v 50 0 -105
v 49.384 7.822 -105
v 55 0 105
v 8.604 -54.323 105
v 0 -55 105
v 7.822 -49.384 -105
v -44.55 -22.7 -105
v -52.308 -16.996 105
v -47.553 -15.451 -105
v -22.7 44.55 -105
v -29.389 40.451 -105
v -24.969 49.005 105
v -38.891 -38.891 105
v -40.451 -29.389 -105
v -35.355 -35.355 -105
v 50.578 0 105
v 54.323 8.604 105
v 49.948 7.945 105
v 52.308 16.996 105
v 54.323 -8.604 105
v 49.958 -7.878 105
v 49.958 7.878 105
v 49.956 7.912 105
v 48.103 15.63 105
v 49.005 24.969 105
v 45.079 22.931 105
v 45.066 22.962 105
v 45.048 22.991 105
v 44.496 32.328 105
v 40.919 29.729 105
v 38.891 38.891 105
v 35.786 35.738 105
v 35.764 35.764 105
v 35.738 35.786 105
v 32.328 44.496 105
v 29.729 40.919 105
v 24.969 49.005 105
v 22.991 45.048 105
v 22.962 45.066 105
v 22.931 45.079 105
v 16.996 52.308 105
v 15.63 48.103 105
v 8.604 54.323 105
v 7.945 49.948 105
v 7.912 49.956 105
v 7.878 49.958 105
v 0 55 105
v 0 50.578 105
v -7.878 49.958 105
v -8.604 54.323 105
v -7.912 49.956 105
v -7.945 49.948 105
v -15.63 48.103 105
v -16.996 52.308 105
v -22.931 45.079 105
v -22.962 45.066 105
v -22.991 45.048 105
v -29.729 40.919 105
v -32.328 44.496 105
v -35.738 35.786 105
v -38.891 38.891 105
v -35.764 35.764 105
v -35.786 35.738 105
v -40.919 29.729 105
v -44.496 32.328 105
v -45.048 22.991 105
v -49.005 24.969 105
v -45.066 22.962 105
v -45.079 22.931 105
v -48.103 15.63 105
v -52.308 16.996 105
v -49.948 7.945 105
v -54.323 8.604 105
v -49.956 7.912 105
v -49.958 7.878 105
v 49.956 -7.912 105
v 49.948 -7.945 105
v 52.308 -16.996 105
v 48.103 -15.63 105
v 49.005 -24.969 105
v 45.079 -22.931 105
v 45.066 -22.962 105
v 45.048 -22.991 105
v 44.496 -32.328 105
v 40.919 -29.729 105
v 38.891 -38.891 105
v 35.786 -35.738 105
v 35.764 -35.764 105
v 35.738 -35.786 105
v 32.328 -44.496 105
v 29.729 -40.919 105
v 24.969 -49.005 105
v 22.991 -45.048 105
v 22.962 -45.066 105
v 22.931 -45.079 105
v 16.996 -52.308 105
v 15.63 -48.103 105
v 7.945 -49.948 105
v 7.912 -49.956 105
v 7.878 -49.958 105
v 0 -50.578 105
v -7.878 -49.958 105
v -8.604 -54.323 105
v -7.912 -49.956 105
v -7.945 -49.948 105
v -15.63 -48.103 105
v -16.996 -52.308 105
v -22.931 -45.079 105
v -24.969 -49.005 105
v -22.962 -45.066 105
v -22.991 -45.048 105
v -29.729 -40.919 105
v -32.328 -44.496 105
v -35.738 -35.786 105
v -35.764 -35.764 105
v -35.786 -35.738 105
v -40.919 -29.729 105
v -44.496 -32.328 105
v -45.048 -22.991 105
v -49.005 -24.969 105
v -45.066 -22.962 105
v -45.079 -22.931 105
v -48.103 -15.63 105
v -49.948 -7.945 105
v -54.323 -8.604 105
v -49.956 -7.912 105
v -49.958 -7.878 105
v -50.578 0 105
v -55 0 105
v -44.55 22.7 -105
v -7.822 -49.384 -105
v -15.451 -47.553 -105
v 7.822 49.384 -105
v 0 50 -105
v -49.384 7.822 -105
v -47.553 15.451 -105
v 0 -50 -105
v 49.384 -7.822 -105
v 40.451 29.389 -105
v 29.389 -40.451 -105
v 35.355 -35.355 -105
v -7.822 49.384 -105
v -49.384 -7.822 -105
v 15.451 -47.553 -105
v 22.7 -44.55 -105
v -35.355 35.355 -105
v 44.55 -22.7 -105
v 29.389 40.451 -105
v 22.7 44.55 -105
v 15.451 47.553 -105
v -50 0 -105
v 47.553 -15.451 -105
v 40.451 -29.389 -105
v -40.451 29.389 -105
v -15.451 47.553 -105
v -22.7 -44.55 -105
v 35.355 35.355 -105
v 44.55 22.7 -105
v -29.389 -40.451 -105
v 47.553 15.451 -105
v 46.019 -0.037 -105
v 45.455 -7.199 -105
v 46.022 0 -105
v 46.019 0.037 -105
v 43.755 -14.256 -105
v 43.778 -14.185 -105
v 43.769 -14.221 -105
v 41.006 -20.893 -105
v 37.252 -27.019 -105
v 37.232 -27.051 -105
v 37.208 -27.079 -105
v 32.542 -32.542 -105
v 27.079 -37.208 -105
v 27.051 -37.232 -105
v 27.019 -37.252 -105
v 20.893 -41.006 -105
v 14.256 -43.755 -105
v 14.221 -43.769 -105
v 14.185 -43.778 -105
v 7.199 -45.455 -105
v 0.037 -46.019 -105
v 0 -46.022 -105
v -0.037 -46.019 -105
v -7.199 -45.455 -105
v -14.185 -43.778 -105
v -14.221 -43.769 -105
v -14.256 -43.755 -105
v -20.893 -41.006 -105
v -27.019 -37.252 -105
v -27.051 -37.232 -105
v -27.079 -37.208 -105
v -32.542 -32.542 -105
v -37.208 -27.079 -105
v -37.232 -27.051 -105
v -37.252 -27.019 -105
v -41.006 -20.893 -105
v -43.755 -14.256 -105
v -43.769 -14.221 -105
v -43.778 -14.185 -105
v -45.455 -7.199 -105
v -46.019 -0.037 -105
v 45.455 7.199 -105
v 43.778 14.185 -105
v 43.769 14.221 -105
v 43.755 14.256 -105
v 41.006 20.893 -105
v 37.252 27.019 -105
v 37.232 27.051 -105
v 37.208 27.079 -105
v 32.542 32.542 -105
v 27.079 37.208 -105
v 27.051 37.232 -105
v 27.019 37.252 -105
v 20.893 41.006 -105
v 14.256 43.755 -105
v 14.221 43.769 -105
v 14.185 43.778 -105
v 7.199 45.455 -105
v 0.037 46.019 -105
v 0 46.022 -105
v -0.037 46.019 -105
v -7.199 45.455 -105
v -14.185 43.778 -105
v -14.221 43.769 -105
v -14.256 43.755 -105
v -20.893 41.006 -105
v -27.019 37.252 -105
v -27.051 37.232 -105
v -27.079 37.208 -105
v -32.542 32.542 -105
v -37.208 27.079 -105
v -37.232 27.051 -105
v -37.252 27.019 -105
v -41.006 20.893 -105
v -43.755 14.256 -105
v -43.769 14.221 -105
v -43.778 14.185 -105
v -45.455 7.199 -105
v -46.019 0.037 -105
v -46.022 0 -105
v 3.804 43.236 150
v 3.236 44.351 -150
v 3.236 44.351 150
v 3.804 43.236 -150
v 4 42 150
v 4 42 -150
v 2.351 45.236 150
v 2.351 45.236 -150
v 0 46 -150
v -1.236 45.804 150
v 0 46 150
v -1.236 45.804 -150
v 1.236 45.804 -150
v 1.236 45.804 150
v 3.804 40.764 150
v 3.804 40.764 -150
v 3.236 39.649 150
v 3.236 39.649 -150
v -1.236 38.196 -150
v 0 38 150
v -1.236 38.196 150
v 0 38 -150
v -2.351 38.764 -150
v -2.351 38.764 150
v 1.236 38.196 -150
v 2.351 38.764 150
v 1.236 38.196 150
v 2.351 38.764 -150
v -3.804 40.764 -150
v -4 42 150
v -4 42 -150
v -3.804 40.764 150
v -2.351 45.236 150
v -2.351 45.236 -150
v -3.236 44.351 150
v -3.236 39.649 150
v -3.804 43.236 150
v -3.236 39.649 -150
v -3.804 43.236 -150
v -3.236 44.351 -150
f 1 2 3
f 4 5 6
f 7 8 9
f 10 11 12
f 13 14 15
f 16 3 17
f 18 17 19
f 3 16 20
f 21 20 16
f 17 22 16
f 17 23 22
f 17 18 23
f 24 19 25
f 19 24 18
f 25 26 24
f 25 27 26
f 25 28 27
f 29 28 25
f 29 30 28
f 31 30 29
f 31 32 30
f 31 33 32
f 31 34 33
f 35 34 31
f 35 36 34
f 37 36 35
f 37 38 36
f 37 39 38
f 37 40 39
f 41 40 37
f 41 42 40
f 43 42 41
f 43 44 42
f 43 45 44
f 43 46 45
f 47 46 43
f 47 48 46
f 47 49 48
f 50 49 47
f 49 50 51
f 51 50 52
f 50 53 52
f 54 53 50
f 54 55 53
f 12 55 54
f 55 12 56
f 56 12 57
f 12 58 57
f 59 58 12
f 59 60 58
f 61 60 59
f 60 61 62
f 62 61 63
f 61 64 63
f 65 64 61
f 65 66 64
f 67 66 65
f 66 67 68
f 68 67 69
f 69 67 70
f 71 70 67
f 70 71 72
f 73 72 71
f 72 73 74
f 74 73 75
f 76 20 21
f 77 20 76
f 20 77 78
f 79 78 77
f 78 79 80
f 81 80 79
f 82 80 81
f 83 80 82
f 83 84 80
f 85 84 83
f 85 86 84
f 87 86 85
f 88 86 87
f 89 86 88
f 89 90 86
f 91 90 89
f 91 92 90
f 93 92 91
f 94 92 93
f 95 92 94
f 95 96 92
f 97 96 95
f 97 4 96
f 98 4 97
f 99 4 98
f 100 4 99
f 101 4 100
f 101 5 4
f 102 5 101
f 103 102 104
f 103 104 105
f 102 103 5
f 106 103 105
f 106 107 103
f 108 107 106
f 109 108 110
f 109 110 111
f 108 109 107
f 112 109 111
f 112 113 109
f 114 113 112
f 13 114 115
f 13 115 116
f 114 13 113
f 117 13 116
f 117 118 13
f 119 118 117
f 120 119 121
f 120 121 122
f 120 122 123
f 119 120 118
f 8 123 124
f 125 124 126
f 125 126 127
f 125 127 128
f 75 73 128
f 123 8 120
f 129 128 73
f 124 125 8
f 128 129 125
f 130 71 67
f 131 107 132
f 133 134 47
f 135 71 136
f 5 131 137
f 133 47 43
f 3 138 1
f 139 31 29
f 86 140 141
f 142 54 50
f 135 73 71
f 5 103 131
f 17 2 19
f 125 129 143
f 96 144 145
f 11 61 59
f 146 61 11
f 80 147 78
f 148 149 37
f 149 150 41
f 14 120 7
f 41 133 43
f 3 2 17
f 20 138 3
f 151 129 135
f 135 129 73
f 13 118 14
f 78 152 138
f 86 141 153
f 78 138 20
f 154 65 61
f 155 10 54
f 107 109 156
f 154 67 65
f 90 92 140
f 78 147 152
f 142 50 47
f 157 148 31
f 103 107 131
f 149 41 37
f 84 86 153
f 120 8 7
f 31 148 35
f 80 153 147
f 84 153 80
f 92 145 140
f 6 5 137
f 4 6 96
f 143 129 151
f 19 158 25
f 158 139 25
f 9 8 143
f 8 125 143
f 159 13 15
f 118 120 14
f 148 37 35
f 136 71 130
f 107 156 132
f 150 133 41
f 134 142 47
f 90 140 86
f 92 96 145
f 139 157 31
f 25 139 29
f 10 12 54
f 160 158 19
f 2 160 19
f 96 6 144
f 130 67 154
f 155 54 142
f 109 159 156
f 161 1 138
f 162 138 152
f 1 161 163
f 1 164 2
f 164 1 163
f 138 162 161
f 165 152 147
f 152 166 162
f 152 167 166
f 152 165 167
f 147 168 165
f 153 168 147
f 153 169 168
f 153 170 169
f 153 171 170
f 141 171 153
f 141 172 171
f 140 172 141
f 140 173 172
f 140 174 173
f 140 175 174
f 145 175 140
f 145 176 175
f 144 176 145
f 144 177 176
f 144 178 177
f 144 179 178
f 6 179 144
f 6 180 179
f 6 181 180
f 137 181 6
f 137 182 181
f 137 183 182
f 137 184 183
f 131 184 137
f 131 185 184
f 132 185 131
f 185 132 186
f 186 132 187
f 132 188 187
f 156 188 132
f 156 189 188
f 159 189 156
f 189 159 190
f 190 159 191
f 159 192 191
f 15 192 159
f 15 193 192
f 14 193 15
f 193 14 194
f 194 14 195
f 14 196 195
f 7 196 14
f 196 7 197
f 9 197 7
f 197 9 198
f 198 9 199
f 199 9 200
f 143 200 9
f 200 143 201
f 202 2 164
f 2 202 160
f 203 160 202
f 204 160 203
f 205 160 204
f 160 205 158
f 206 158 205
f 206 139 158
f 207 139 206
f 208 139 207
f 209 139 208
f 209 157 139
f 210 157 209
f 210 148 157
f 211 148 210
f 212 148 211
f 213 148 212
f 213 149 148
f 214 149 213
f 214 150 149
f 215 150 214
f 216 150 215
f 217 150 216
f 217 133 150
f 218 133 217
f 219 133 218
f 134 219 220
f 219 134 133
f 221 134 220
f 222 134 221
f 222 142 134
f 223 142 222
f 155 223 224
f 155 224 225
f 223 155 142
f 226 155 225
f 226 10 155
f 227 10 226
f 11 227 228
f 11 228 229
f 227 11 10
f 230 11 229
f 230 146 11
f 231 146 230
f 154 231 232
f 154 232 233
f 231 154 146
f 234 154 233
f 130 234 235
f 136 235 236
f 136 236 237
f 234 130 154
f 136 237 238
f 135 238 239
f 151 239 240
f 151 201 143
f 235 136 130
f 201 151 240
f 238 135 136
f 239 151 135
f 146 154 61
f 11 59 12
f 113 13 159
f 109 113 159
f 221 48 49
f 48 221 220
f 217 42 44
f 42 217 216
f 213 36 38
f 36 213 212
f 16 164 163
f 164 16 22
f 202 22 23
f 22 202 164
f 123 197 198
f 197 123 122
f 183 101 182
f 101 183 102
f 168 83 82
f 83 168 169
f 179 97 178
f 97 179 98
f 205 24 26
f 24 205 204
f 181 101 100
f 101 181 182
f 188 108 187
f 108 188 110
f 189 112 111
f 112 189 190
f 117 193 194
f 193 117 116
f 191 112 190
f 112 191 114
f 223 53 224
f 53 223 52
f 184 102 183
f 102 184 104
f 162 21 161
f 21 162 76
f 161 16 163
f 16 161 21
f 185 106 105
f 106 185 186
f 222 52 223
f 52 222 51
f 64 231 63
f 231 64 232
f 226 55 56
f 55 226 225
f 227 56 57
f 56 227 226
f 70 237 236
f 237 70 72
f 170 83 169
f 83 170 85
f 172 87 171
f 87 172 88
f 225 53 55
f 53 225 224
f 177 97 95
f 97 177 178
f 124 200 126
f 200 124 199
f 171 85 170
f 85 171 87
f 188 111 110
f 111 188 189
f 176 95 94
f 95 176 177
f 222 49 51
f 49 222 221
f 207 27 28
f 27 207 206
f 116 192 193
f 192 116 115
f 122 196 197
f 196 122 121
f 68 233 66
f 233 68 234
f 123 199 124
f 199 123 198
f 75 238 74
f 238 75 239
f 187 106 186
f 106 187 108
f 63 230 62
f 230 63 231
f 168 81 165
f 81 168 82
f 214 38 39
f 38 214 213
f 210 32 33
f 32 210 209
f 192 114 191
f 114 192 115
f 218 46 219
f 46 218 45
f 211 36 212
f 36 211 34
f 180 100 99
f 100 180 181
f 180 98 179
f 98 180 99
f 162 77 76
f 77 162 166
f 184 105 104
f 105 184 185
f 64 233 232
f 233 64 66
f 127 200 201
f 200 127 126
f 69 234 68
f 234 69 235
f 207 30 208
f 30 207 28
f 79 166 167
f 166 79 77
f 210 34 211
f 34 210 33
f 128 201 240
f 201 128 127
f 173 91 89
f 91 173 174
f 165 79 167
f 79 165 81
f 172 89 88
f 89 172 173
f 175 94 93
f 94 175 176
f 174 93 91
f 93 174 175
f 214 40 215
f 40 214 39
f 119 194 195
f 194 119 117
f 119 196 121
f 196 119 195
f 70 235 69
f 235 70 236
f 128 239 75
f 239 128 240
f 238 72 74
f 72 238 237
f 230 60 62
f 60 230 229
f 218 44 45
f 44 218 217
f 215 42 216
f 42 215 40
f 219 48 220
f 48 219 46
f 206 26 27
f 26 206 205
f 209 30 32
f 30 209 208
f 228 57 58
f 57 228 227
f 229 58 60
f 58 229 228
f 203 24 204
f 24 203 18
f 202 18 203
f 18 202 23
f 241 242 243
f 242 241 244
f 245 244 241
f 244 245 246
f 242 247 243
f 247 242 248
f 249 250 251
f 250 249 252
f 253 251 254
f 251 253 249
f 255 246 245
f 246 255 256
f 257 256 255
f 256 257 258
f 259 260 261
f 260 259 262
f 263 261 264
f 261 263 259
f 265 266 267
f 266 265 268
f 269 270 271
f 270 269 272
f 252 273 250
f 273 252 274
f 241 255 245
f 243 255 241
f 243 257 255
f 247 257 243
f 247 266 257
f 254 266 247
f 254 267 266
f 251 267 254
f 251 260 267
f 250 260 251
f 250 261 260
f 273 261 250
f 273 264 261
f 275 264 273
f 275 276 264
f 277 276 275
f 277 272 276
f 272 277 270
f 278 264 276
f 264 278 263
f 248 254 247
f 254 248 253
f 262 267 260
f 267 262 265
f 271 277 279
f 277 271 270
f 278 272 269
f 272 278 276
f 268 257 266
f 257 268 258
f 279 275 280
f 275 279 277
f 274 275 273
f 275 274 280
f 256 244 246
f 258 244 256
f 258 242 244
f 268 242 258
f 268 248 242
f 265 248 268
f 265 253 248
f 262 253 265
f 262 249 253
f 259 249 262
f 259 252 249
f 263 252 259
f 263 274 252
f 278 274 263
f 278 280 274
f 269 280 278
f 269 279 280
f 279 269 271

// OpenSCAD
		lungo = 210;
		raggio = 50;
		spessore=4;
		fattore = 1.1;
		eccent = 5;
	asta = 300;
	module cassa(){
		difference(){
			union(){
			cylinder(r1=raggio,r2=fattore*raggio,h=lungo,$fn=40);
			}
			union(){
			translate([0,0,-1])cylinder(r1=raggio-spessore,r2=fattore*(raggio-spessore),h=lungo+2,$fn=40);
			}
		}
	}

translate([0,0,-lungo/2])cassa();
translate([0,raggio-spessore-4,-asta/2])rotate([0,0,0])cylinder(h=asta,d=8,$fn=20);
